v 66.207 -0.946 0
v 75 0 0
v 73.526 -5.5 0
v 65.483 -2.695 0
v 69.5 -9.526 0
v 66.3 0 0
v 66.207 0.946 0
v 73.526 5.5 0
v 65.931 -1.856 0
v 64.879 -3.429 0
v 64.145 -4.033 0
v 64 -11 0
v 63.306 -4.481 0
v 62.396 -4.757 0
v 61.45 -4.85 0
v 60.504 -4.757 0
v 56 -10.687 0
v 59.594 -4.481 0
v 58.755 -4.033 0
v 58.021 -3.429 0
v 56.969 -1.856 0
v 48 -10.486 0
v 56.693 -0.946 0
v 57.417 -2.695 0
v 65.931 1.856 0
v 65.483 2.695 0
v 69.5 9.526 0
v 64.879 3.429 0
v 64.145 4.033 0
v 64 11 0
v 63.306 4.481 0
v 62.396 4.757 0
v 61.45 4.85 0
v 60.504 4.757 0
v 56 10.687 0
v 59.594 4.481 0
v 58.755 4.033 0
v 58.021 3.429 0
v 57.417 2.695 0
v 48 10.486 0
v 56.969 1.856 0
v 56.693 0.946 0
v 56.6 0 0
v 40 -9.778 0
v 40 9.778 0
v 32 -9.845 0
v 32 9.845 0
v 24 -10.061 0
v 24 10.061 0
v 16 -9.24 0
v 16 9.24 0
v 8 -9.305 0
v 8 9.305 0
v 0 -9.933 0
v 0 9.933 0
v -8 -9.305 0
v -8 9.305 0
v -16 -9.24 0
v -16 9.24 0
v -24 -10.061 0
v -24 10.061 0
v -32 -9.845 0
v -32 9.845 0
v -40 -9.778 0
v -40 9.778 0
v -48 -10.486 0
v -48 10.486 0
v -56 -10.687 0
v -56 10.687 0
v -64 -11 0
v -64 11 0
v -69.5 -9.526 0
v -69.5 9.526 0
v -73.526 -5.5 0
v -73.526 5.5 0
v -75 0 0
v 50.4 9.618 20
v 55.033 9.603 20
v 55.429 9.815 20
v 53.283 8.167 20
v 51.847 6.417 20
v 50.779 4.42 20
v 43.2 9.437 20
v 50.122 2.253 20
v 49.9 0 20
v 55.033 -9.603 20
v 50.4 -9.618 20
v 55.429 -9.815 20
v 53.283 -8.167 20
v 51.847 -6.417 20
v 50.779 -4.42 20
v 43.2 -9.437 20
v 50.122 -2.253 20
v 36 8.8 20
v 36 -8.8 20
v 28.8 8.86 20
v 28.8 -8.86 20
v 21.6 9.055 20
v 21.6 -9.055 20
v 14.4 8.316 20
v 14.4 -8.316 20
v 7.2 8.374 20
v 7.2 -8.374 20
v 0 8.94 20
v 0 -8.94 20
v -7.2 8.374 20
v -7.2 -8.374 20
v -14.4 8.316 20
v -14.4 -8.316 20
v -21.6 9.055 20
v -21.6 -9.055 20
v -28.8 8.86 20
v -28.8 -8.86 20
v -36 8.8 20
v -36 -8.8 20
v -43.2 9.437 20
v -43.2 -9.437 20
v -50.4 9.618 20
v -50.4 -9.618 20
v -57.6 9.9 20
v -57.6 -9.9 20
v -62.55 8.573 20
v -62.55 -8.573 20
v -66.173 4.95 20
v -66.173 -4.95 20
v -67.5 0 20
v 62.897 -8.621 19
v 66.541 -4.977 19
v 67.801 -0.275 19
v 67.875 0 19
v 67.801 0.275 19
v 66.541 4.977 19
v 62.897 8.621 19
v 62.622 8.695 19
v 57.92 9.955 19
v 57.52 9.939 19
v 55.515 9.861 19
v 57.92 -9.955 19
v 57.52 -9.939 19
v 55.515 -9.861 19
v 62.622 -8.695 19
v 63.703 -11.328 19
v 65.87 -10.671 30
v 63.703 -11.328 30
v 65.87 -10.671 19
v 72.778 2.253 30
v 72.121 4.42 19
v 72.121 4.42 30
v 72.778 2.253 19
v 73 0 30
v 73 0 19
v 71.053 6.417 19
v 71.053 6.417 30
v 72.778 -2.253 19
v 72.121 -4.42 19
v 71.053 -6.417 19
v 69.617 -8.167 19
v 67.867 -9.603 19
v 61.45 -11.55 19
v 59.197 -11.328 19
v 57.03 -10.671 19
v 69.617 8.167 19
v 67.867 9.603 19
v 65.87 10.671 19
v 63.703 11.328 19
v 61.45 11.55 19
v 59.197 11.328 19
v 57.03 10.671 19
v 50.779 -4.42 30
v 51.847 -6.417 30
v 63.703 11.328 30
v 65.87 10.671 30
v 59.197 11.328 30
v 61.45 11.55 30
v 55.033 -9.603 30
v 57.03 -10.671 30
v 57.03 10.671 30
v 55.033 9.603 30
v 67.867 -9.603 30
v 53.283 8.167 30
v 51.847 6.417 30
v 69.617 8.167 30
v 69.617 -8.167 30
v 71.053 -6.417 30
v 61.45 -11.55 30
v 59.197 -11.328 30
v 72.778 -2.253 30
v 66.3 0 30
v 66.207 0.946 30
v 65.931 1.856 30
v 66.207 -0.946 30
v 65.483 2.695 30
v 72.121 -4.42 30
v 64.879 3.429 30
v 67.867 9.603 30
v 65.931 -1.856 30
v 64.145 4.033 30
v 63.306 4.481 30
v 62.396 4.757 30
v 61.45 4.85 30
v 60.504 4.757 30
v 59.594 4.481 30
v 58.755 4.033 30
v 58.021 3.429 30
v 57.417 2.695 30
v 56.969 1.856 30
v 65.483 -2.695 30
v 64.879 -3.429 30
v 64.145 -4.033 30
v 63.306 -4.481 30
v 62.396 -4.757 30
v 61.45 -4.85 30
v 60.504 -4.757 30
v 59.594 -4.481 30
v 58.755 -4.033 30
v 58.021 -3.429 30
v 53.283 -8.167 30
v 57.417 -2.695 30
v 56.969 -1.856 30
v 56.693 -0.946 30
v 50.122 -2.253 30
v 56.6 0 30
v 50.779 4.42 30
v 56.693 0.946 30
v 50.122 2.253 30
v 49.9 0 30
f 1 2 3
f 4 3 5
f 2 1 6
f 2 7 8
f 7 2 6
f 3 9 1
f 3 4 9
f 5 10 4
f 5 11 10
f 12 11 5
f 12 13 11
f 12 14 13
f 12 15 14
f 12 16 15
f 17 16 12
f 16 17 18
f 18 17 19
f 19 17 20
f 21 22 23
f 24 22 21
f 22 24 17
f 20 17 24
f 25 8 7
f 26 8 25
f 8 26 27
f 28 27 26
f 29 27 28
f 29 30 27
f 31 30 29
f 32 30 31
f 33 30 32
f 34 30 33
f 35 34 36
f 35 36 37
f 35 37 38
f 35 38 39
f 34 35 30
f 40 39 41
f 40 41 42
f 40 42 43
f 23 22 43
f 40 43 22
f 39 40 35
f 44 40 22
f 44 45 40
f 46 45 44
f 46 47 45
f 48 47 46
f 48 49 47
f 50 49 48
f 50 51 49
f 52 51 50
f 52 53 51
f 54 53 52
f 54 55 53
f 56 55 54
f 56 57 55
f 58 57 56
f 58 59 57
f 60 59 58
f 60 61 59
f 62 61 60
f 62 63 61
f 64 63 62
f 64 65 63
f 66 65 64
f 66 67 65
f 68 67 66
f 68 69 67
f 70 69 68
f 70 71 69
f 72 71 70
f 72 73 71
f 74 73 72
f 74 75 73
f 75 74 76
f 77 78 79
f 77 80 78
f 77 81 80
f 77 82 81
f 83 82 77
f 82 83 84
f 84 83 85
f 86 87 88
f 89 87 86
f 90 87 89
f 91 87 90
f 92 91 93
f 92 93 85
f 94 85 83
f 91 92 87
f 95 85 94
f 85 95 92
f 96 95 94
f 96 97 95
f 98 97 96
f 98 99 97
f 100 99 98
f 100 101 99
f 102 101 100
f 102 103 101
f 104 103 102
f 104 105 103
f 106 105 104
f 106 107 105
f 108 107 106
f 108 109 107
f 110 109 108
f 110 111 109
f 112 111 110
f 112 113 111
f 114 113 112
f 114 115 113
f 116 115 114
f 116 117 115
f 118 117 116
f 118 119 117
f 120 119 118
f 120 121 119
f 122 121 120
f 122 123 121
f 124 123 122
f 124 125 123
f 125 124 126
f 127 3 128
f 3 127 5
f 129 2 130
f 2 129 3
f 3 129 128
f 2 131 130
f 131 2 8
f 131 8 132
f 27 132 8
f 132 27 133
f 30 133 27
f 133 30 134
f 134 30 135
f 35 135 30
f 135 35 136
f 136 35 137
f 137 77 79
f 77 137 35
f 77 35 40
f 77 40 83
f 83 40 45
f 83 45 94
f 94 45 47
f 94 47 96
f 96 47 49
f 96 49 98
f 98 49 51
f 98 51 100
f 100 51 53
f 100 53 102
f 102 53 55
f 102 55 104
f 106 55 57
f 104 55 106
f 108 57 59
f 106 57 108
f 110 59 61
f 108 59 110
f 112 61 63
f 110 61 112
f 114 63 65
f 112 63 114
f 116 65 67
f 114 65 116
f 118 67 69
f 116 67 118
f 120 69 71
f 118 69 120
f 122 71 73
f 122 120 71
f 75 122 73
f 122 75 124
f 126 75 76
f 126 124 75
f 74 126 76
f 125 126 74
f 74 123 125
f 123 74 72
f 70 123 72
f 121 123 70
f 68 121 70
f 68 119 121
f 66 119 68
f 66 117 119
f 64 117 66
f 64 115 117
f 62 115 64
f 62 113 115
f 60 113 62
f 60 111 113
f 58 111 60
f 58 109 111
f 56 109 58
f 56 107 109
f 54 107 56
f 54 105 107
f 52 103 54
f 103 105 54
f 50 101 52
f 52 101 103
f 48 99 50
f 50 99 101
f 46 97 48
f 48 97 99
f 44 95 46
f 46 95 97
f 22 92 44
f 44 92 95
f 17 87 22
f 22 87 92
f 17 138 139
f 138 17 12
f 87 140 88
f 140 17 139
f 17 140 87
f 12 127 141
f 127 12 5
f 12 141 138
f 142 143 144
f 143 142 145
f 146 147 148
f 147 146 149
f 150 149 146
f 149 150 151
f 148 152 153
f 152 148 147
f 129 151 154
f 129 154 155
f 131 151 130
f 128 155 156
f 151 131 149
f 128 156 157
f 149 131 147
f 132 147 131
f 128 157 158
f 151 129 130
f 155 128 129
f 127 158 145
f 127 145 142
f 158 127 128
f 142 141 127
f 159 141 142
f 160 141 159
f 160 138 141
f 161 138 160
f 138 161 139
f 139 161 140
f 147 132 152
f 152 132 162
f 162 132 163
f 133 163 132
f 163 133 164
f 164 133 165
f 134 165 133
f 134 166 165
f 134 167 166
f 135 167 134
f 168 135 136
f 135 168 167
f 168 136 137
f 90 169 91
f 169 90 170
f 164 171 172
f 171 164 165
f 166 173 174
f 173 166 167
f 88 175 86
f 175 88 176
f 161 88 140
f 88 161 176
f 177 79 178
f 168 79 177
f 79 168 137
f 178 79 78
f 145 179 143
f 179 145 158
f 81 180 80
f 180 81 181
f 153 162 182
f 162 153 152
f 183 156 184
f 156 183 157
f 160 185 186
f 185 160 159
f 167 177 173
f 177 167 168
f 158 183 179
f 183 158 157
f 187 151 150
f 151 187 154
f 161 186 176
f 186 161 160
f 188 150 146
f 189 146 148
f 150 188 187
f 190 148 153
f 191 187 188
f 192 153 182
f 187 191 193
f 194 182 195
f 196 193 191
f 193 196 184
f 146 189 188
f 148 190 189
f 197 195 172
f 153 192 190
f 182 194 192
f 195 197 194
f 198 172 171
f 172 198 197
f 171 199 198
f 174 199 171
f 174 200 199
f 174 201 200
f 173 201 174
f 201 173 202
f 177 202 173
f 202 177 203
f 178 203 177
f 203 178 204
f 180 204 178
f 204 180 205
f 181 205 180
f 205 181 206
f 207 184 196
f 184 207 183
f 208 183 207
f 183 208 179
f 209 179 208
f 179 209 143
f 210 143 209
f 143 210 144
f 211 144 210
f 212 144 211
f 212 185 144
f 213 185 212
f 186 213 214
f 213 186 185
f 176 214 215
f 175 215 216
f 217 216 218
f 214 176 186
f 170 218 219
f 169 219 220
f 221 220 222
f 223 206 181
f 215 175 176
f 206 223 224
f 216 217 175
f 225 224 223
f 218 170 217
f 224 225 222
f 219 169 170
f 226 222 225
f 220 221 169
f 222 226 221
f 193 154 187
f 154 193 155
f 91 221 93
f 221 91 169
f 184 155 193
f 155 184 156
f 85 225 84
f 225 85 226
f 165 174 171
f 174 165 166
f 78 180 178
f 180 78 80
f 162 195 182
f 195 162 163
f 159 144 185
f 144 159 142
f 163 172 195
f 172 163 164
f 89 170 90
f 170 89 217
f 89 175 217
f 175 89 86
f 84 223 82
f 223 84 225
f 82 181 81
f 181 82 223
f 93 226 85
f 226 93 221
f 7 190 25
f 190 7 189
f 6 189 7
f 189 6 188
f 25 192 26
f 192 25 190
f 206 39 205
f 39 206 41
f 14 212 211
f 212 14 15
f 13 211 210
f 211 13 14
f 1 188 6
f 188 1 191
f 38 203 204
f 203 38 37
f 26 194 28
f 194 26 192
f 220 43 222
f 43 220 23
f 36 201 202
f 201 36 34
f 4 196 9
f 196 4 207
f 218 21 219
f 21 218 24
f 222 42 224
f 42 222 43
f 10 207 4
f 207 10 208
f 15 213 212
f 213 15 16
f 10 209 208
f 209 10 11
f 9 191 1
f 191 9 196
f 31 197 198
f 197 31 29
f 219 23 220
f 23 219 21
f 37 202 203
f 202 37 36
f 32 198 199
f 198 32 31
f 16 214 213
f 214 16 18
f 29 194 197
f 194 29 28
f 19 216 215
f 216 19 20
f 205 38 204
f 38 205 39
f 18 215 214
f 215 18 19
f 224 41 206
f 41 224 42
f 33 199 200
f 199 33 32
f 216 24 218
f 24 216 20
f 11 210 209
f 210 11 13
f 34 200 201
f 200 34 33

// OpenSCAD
$fn = 32;

// ----------------------------------------------------------------------
// Handle: 150 x 22 mm grip, 20 mm thick
// ----------------------------------------------------------------------

// --- parameters (mm) ---
length = 150;             // grip length
width = 22;               // grip width
thickness = 20;           // grip thickness
waist = 0.86;             // width factor at the middle
draft = 0.9;              // top face scale of the extrusion
scallops = 5;             // finger rests per side
ripple = 0.05;            // depth factor of the finger rests
boss_d = 23.1;            // mounting boss diameter
boss_h = 10;              // mounting boss height
boss_hole_d = 9.7;        // screw clearance through the boss
boss_r = 61.45;           // boss centre from the grip centre

/* ergonomic grip outline, closed spline-like polygon in the XY plane */
grip = [[-64, 11], [-56, 10.687], [-48, 10.486], [-40, 9.778], [-32, 9.845], [-24, 10.061], [-16, 9.24], [-8, 9.305], [0, 9.933], [8, 9.305], [16, 9.24], [24, 10.061], [32, 9.845], [40, 9.778], [48, 10.486], [56, 10.687], [64, 11], [69.5, 9.526], [73.526, 5.5], [75, 0], [73.526, -5.5], [69.5, -9.526], [64, -11], [64, -11], [56, -10.687], [48, -10.486], [40, -9.778], [32, -9.845], [24, -10.061], [16, -9.24], [8, -9.305], [0, -9.933], [-8, -9.305], [-16, -9.24], [-24, -10.061], [-32, -9.845], [-40, -9.778], [-48, -10.486], [-56, -10.687], [-64, -11], [-69.5, -9.526], [-73.526, -5.5], [-75, 0], [-73.526, 5.5], [-69.5, 9.526], [-64, 11]];

module grip_body() {
  linear_extrude(height = thickness, scale = draft) polygon(grip);
}

module boss_body() {
  /* sunk 1 mm into the grip so the joint overlaps */
  translate([boss_r, 0, thickness - 1]) cylinder(h = boss_h + 1, d = boss_d);
}

difference() {
  union() {
    grip_body();
    boss_body();
  }
  translate([boss_r, 0, -1]) cylinder(h = thickness + boss_h + 2, d = boss_hole_d);
}
